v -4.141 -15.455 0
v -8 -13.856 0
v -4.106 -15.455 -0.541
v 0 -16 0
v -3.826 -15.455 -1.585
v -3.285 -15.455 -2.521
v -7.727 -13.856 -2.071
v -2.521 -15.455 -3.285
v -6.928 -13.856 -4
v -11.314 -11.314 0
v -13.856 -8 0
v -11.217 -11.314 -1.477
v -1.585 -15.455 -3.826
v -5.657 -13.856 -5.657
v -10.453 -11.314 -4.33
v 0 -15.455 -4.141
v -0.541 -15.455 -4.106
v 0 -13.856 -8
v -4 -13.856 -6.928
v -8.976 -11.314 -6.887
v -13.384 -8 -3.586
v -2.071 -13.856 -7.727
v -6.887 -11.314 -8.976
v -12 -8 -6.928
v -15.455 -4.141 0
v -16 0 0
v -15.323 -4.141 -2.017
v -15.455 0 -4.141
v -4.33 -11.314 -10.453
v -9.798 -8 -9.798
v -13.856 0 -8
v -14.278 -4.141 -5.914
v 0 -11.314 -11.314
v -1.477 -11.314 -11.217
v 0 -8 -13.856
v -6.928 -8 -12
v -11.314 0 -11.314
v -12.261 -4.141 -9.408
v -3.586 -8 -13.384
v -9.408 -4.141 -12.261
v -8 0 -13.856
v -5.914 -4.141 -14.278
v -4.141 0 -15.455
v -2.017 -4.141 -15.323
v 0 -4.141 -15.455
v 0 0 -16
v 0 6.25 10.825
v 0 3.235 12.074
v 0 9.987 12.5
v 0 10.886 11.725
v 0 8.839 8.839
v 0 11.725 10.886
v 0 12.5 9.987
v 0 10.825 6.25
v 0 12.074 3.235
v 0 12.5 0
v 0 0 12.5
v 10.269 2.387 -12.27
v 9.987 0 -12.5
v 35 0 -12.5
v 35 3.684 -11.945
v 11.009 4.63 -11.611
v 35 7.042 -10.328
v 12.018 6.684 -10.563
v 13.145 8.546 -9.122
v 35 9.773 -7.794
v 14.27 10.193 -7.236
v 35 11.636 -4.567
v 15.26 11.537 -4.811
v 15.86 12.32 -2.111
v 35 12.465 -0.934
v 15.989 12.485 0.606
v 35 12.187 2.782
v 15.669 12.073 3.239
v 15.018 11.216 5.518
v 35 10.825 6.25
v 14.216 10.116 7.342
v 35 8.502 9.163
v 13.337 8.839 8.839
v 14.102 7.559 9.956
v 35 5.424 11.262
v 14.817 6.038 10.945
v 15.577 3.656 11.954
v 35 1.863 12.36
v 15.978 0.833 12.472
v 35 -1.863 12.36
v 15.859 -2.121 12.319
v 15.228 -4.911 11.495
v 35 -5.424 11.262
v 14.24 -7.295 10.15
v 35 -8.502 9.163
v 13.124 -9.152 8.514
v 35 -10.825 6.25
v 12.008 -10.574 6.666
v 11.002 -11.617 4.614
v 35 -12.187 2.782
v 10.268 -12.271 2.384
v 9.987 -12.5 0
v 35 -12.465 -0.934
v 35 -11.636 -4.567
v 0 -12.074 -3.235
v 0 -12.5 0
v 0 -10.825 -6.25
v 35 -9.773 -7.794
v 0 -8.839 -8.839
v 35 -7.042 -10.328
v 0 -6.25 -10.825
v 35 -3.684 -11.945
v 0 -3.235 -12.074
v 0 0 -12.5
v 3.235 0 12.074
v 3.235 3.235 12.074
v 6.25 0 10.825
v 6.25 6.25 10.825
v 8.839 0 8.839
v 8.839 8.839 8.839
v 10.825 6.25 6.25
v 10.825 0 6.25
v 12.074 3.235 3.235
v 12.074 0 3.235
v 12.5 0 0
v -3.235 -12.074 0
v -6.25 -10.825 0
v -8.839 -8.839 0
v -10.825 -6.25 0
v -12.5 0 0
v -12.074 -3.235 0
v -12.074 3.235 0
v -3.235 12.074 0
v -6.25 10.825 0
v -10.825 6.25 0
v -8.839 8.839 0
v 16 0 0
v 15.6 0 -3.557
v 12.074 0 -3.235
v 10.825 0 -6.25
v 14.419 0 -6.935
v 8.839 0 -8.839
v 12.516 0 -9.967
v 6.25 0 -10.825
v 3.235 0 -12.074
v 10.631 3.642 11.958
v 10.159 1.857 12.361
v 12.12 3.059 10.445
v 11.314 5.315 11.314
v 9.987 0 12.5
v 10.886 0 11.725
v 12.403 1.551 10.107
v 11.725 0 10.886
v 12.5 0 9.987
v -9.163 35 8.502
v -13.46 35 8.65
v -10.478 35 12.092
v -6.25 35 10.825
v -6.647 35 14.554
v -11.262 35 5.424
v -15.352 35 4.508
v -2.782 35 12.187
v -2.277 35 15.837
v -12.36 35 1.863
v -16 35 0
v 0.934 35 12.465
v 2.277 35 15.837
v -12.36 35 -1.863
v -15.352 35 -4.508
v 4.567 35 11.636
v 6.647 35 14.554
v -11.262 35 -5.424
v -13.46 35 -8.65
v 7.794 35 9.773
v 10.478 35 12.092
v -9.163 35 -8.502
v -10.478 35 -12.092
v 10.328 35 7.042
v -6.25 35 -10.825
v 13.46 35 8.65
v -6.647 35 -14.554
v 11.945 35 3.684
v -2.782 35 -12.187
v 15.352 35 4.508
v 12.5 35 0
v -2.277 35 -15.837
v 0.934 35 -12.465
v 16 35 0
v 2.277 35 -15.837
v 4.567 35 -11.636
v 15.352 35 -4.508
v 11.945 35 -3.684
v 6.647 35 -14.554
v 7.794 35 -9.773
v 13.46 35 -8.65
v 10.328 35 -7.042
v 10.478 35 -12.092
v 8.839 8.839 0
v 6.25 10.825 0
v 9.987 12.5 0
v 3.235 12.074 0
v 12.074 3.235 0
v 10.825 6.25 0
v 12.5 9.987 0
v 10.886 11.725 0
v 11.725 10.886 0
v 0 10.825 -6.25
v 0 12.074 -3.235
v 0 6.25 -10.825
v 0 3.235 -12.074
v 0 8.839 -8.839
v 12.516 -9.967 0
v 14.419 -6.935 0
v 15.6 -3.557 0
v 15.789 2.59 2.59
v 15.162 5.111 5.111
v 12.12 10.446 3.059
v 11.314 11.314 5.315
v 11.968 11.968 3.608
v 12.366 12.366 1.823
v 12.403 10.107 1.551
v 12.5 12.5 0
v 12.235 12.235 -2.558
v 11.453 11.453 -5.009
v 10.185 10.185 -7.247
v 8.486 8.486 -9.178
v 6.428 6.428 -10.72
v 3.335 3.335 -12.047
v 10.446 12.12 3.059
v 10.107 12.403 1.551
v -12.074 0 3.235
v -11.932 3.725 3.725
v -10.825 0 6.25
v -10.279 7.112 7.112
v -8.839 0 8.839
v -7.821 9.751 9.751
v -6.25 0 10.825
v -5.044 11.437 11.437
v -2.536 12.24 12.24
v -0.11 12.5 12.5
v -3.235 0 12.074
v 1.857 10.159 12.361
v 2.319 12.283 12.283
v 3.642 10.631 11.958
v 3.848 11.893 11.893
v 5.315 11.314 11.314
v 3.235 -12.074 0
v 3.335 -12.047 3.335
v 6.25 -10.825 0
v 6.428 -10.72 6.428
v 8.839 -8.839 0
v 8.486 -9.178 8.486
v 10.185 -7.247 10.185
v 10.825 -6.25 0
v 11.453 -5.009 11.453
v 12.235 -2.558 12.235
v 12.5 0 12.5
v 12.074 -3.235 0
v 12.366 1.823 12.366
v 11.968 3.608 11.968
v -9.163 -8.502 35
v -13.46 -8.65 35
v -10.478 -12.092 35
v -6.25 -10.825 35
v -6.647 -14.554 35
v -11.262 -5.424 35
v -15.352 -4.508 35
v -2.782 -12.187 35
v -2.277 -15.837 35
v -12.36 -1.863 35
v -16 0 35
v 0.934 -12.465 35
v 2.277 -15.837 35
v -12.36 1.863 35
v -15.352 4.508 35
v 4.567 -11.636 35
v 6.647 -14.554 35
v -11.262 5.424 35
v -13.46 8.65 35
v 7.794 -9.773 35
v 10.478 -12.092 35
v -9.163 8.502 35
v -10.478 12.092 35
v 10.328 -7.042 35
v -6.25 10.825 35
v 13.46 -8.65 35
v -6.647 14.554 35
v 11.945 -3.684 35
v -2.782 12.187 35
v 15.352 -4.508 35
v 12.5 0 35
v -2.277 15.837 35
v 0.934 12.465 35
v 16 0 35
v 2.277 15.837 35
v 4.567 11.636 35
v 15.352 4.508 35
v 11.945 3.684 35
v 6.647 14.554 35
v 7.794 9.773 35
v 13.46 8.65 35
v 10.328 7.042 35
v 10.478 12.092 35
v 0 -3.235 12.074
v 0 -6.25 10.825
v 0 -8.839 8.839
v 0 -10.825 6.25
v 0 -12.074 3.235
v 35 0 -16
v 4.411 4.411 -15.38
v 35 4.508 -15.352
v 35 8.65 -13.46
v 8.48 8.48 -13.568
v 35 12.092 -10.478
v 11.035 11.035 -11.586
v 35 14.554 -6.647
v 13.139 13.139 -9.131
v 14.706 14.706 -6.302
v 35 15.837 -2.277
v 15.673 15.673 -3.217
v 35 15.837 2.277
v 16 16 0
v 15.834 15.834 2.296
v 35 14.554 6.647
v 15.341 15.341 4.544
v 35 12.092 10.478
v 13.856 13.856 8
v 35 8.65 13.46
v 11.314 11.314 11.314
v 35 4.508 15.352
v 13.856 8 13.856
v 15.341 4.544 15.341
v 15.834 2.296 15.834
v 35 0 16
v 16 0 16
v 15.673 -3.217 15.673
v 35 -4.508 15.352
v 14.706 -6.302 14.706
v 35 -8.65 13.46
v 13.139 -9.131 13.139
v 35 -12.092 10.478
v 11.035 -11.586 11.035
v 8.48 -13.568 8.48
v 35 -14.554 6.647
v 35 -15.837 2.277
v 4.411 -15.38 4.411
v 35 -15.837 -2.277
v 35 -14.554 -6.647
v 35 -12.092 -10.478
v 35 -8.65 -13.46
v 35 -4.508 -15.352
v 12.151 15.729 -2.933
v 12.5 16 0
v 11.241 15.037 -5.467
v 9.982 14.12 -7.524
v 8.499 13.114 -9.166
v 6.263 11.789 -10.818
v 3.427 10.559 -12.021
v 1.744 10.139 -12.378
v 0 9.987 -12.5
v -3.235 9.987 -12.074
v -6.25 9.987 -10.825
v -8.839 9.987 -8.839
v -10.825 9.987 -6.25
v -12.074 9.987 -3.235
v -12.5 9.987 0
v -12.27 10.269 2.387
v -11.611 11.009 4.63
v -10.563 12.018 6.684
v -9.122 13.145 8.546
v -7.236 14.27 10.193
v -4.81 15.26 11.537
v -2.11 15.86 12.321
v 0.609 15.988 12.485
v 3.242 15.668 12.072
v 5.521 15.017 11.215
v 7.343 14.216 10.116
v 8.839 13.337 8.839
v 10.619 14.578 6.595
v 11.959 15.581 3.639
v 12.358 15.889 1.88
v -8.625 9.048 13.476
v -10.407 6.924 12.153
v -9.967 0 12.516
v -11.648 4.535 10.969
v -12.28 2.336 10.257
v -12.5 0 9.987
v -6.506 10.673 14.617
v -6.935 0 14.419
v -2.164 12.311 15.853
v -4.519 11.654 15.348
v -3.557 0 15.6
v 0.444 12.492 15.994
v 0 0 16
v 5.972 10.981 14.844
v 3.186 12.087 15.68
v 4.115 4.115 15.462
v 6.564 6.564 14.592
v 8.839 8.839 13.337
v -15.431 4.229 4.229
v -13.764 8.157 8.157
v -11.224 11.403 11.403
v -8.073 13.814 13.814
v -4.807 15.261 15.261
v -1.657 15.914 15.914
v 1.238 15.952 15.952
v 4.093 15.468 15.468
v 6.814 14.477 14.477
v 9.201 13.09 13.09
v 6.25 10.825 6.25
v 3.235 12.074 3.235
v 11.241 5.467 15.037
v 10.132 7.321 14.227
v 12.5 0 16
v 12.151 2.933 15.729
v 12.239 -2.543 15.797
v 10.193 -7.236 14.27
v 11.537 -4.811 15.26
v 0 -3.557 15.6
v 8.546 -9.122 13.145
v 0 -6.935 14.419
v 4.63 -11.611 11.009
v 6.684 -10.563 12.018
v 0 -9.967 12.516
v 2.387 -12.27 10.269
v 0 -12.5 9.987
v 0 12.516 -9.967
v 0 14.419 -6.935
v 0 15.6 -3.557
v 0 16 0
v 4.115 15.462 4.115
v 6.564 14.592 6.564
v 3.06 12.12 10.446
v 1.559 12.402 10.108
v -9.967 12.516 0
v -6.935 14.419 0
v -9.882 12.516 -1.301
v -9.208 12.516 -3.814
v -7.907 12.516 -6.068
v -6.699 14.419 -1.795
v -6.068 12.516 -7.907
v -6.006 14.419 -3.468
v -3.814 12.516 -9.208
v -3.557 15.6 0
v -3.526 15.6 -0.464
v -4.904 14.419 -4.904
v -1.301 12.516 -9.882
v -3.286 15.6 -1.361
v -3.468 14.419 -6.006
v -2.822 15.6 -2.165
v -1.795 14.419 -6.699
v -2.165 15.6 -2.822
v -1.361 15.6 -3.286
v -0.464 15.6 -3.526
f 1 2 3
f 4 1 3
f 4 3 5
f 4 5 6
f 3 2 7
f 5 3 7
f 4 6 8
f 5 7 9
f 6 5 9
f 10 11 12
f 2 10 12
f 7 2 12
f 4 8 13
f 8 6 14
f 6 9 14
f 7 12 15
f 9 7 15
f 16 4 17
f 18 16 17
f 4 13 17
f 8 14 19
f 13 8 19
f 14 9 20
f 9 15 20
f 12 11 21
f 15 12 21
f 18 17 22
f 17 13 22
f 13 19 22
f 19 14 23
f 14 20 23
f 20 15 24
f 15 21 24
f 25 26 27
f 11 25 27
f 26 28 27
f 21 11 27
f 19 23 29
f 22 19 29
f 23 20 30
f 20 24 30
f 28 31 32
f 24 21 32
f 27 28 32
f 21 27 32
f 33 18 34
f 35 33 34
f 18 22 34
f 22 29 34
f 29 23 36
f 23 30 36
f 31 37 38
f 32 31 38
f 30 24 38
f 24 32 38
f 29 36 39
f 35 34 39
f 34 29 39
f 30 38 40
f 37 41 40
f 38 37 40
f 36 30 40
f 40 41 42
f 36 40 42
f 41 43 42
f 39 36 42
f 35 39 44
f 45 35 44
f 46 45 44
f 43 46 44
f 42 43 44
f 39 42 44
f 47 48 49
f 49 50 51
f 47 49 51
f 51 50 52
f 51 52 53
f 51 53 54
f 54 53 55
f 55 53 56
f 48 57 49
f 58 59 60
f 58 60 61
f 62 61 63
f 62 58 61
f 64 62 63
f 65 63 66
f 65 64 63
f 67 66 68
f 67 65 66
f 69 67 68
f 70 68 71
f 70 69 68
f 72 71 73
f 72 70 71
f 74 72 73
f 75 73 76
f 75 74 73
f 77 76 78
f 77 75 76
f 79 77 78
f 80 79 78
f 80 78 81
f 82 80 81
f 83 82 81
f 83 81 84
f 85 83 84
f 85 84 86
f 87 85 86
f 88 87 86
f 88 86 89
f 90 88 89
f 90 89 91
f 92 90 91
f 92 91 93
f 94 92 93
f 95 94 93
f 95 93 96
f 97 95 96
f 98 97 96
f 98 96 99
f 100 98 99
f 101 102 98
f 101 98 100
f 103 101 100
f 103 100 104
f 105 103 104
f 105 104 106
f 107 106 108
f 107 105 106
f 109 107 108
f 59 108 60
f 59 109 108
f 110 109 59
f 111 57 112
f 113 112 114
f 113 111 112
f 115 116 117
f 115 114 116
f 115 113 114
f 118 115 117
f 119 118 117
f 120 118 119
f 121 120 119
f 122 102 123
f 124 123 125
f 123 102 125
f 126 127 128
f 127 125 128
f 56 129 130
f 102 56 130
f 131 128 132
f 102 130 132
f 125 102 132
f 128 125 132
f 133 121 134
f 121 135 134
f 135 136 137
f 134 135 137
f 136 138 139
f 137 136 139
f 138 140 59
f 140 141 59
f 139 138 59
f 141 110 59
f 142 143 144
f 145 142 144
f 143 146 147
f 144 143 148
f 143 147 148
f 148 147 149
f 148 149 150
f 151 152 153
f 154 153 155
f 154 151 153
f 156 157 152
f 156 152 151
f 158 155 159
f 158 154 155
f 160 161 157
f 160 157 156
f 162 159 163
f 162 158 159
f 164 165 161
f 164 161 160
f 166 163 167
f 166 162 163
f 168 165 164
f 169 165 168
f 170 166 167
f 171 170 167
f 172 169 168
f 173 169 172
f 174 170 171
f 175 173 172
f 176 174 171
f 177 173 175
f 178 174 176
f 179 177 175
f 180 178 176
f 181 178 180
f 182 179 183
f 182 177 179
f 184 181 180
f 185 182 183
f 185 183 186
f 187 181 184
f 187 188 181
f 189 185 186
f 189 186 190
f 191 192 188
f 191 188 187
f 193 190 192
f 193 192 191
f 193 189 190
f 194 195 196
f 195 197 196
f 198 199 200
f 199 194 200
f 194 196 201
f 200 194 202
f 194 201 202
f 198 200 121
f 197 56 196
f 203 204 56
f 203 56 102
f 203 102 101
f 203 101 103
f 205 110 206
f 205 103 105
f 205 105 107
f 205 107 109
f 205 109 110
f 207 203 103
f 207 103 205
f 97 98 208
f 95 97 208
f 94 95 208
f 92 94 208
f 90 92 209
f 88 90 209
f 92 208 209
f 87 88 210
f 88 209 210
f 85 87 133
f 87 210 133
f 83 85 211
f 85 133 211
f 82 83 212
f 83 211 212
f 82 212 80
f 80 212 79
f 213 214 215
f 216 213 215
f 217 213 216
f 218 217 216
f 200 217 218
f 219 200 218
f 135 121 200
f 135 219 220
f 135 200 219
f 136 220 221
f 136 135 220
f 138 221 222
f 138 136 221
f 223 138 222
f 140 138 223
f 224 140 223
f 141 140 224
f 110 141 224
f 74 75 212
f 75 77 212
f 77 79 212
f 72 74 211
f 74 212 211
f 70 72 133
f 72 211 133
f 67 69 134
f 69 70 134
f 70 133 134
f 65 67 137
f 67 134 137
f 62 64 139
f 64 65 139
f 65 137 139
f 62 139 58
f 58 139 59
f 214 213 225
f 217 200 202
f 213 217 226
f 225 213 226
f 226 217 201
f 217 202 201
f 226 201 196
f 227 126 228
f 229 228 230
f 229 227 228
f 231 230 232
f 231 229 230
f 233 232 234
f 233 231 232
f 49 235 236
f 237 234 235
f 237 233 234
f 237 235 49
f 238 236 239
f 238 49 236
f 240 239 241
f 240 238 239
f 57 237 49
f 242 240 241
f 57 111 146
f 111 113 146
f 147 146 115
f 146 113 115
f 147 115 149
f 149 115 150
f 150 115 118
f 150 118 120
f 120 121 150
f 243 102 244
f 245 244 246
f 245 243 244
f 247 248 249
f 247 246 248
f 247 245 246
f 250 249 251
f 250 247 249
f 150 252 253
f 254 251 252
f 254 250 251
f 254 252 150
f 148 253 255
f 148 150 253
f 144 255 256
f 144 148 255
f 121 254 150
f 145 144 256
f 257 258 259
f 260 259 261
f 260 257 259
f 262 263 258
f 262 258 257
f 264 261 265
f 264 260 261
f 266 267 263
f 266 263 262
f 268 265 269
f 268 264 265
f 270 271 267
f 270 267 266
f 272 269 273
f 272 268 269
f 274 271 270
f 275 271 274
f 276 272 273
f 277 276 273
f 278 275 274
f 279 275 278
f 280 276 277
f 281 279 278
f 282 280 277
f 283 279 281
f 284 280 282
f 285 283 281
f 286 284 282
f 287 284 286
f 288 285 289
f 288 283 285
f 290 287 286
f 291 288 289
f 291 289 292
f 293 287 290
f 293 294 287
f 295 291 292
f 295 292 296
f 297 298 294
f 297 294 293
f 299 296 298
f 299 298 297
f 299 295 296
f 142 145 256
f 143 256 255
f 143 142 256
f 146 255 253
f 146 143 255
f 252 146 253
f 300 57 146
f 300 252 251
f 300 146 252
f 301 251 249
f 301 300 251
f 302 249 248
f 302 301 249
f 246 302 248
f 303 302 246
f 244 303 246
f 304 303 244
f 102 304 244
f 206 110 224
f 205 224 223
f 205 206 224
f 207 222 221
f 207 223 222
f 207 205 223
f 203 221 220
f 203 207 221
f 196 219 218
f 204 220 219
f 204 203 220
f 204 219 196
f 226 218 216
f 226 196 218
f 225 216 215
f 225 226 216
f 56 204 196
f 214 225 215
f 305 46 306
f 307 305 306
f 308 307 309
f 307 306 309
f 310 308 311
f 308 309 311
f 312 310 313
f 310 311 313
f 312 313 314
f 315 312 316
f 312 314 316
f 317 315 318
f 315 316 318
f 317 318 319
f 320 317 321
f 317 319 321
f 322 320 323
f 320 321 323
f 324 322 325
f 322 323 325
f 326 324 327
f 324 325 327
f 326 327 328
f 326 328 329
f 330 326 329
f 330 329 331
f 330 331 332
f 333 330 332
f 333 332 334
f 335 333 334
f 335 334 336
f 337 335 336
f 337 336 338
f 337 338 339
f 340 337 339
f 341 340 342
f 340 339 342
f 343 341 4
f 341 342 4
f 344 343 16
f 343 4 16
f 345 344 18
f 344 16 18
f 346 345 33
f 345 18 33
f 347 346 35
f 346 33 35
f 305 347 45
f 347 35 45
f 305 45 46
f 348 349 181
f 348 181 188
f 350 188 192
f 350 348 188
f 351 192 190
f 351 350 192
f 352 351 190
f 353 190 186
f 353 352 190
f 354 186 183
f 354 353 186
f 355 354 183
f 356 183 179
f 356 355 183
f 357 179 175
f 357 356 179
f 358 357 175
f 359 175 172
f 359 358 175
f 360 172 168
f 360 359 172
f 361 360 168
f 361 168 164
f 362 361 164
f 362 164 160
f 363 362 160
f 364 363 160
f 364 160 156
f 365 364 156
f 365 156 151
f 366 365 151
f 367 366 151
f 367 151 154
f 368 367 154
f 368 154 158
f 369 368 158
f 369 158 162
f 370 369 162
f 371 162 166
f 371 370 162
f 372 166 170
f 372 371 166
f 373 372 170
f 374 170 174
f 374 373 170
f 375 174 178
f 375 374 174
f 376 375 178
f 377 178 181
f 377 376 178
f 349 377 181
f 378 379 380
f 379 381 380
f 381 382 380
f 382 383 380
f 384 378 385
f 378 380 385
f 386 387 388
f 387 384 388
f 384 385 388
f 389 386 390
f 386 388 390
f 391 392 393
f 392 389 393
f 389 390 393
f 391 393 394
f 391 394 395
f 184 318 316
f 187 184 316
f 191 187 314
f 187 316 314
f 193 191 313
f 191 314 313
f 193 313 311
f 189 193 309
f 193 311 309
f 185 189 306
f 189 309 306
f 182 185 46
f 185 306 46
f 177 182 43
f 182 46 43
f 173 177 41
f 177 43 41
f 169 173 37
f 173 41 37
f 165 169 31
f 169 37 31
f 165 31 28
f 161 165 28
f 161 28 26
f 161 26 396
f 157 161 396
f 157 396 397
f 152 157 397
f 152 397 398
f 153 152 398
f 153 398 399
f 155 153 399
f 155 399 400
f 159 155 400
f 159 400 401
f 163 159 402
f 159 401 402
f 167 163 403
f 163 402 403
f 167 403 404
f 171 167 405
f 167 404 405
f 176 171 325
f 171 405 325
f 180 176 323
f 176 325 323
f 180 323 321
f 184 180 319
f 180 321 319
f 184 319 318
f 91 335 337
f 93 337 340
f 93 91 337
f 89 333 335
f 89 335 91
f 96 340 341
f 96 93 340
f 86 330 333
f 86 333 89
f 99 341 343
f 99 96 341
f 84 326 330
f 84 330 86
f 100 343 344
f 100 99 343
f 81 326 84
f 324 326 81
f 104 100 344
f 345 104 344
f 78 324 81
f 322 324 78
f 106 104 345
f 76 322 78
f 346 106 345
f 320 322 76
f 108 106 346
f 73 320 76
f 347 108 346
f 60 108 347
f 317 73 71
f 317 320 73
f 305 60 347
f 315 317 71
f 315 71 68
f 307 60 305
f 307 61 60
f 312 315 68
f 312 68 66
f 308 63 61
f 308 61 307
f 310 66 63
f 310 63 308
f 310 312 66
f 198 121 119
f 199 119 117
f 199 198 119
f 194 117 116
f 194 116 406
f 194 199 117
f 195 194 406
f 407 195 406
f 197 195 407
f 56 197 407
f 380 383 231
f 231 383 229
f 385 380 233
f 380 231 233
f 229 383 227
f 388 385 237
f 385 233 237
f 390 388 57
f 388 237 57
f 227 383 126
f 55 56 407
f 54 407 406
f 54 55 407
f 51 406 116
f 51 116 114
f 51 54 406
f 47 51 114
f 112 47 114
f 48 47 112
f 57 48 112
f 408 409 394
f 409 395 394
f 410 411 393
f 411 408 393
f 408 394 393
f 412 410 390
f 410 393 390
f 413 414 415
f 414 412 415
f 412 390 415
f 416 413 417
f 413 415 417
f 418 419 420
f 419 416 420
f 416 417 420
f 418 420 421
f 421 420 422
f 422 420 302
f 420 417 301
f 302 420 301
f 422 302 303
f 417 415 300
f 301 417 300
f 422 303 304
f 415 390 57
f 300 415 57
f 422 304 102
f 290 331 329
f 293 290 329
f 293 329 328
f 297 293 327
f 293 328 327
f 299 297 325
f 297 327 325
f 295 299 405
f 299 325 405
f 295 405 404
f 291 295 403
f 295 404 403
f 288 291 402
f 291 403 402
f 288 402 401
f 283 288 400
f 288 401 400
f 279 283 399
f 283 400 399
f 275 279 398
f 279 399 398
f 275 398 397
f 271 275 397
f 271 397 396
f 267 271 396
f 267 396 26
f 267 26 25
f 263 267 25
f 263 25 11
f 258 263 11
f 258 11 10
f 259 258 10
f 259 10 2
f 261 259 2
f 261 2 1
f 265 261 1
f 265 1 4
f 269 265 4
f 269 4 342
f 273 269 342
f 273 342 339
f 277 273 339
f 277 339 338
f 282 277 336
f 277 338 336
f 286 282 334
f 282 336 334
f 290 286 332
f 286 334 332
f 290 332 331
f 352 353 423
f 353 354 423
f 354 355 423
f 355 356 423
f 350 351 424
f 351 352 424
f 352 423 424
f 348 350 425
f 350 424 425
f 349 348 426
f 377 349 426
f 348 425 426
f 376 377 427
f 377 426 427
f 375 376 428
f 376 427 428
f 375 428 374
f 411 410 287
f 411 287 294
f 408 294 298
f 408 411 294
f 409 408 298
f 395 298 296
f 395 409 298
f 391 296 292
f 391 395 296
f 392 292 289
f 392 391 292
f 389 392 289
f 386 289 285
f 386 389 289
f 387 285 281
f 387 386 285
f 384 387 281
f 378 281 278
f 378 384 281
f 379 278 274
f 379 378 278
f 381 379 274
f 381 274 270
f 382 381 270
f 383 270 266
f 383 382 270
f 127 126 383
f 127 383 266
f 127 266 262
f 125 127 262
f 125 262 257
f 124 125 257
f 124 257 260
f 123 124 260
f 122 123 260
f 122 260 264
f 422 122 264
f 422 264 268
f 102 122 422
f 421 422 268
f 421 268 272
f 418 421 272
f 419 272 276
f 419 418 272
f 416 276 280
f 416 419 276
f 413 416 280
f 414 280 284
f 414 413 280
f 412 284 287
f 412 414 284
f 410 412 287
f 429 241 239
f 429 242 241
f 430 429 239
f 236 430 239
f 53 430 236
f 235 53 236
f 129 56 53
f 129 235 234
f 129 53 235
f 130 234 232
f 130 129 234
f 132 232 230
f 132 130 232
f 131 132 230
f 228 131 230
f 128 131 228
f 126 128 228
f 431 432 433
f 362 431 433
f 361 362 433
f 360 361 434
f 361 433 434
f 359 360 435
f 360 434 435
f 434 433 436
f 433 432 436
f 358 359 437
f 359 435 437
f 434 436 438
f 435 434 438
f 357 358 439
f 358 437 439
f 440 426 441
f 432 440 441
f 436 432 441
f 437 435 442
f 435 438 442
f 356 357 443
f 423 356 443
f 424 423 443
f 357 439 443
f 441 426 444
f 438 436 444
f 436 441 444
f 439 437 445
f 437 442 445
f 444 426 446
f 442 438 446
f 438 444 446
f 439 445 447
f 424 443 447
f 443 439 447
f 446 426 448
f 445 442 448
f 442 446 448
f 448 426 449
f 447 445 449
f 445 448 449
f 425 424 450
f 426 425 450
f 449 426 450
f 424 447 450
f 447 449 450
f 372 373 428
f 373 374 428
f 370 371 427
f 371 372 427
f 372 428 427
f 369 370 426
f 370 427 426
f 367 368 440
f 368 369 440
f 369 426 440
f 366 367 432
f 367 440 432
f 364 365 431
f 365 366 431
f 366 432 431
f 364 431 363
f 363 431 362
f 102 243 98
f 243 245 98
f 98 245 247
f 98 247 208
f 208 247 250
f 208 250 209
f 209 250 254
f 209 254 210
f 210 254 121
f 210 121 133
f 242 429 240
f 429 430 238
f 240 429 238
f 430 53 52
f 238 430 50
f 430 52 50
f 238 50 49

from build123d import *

# Parameters (mm, degrees)
SKETCH_1_R      = 16
SKETCH_1_R_2    = 12.5
EXTRUDE_1_DEPTH = 35
SKETCH_2_R      = 16
SKETCH_2_R_2    = 12.5
EXTRUDE_2_DEPTH = 35
SKETCH_4_R      = 16
SKETCH_4_R_2    = 12.5
EXTRUDE_3_DEPTH = 35
REVOLVE_1_ANGLE = 90


with BuildPart() as part:
    # 草图1 → 凸台-拉伸1 (new body)
    with BuildSketch(Plane.XY):
        Circle(SKETCH_1_R)
        Circle(SKETCH_1_R_2, mode=Mode.SUBTRACT)
    extrude(amount=EXTRUDE_1_DEPTH)

    # 草图2 → 凸台-拉伸2 (add)
    with BuildSketch(Plane(origin=(0, 0, 0), x_dir=(0, 0, -1), z_dir=(1, 0, 0))):
        Circle(SKETCH_2_R)
        Circle(SKETCH_2_R_2, mode=Mode.SUBTRACT)
    extrude(amount=EXTRUDE_2_DEPTH)

    # 草图4 → 凸台-拉伸3 (add)
    with BuildSketch(Plane(origin=(0, 0, 0), x_dir=(1, 0, 0), z_dir=(0, 1, 0))):
        Circle(SKETCH_4_R)
        Circle(SKETCH_4_R_2, mode=Mode.SUBTRACT)
    extrude(amount=EXTRUDE_3_DEPTH)

    # 草图3 → 旋转1 (revolve)
    with BuildSketch(Plane.XY):
        with BuildLine():
            Line((0, 16), (0, -16))
            ThreePointArc((0, -16), (-16, 0), (0, 16))
        make_face()
    revolve(axis=Axis((0, 16, 0), (0, -1, 0)), revolution_arc=REVOLVE_1_ANGLE)


solid = part.part
